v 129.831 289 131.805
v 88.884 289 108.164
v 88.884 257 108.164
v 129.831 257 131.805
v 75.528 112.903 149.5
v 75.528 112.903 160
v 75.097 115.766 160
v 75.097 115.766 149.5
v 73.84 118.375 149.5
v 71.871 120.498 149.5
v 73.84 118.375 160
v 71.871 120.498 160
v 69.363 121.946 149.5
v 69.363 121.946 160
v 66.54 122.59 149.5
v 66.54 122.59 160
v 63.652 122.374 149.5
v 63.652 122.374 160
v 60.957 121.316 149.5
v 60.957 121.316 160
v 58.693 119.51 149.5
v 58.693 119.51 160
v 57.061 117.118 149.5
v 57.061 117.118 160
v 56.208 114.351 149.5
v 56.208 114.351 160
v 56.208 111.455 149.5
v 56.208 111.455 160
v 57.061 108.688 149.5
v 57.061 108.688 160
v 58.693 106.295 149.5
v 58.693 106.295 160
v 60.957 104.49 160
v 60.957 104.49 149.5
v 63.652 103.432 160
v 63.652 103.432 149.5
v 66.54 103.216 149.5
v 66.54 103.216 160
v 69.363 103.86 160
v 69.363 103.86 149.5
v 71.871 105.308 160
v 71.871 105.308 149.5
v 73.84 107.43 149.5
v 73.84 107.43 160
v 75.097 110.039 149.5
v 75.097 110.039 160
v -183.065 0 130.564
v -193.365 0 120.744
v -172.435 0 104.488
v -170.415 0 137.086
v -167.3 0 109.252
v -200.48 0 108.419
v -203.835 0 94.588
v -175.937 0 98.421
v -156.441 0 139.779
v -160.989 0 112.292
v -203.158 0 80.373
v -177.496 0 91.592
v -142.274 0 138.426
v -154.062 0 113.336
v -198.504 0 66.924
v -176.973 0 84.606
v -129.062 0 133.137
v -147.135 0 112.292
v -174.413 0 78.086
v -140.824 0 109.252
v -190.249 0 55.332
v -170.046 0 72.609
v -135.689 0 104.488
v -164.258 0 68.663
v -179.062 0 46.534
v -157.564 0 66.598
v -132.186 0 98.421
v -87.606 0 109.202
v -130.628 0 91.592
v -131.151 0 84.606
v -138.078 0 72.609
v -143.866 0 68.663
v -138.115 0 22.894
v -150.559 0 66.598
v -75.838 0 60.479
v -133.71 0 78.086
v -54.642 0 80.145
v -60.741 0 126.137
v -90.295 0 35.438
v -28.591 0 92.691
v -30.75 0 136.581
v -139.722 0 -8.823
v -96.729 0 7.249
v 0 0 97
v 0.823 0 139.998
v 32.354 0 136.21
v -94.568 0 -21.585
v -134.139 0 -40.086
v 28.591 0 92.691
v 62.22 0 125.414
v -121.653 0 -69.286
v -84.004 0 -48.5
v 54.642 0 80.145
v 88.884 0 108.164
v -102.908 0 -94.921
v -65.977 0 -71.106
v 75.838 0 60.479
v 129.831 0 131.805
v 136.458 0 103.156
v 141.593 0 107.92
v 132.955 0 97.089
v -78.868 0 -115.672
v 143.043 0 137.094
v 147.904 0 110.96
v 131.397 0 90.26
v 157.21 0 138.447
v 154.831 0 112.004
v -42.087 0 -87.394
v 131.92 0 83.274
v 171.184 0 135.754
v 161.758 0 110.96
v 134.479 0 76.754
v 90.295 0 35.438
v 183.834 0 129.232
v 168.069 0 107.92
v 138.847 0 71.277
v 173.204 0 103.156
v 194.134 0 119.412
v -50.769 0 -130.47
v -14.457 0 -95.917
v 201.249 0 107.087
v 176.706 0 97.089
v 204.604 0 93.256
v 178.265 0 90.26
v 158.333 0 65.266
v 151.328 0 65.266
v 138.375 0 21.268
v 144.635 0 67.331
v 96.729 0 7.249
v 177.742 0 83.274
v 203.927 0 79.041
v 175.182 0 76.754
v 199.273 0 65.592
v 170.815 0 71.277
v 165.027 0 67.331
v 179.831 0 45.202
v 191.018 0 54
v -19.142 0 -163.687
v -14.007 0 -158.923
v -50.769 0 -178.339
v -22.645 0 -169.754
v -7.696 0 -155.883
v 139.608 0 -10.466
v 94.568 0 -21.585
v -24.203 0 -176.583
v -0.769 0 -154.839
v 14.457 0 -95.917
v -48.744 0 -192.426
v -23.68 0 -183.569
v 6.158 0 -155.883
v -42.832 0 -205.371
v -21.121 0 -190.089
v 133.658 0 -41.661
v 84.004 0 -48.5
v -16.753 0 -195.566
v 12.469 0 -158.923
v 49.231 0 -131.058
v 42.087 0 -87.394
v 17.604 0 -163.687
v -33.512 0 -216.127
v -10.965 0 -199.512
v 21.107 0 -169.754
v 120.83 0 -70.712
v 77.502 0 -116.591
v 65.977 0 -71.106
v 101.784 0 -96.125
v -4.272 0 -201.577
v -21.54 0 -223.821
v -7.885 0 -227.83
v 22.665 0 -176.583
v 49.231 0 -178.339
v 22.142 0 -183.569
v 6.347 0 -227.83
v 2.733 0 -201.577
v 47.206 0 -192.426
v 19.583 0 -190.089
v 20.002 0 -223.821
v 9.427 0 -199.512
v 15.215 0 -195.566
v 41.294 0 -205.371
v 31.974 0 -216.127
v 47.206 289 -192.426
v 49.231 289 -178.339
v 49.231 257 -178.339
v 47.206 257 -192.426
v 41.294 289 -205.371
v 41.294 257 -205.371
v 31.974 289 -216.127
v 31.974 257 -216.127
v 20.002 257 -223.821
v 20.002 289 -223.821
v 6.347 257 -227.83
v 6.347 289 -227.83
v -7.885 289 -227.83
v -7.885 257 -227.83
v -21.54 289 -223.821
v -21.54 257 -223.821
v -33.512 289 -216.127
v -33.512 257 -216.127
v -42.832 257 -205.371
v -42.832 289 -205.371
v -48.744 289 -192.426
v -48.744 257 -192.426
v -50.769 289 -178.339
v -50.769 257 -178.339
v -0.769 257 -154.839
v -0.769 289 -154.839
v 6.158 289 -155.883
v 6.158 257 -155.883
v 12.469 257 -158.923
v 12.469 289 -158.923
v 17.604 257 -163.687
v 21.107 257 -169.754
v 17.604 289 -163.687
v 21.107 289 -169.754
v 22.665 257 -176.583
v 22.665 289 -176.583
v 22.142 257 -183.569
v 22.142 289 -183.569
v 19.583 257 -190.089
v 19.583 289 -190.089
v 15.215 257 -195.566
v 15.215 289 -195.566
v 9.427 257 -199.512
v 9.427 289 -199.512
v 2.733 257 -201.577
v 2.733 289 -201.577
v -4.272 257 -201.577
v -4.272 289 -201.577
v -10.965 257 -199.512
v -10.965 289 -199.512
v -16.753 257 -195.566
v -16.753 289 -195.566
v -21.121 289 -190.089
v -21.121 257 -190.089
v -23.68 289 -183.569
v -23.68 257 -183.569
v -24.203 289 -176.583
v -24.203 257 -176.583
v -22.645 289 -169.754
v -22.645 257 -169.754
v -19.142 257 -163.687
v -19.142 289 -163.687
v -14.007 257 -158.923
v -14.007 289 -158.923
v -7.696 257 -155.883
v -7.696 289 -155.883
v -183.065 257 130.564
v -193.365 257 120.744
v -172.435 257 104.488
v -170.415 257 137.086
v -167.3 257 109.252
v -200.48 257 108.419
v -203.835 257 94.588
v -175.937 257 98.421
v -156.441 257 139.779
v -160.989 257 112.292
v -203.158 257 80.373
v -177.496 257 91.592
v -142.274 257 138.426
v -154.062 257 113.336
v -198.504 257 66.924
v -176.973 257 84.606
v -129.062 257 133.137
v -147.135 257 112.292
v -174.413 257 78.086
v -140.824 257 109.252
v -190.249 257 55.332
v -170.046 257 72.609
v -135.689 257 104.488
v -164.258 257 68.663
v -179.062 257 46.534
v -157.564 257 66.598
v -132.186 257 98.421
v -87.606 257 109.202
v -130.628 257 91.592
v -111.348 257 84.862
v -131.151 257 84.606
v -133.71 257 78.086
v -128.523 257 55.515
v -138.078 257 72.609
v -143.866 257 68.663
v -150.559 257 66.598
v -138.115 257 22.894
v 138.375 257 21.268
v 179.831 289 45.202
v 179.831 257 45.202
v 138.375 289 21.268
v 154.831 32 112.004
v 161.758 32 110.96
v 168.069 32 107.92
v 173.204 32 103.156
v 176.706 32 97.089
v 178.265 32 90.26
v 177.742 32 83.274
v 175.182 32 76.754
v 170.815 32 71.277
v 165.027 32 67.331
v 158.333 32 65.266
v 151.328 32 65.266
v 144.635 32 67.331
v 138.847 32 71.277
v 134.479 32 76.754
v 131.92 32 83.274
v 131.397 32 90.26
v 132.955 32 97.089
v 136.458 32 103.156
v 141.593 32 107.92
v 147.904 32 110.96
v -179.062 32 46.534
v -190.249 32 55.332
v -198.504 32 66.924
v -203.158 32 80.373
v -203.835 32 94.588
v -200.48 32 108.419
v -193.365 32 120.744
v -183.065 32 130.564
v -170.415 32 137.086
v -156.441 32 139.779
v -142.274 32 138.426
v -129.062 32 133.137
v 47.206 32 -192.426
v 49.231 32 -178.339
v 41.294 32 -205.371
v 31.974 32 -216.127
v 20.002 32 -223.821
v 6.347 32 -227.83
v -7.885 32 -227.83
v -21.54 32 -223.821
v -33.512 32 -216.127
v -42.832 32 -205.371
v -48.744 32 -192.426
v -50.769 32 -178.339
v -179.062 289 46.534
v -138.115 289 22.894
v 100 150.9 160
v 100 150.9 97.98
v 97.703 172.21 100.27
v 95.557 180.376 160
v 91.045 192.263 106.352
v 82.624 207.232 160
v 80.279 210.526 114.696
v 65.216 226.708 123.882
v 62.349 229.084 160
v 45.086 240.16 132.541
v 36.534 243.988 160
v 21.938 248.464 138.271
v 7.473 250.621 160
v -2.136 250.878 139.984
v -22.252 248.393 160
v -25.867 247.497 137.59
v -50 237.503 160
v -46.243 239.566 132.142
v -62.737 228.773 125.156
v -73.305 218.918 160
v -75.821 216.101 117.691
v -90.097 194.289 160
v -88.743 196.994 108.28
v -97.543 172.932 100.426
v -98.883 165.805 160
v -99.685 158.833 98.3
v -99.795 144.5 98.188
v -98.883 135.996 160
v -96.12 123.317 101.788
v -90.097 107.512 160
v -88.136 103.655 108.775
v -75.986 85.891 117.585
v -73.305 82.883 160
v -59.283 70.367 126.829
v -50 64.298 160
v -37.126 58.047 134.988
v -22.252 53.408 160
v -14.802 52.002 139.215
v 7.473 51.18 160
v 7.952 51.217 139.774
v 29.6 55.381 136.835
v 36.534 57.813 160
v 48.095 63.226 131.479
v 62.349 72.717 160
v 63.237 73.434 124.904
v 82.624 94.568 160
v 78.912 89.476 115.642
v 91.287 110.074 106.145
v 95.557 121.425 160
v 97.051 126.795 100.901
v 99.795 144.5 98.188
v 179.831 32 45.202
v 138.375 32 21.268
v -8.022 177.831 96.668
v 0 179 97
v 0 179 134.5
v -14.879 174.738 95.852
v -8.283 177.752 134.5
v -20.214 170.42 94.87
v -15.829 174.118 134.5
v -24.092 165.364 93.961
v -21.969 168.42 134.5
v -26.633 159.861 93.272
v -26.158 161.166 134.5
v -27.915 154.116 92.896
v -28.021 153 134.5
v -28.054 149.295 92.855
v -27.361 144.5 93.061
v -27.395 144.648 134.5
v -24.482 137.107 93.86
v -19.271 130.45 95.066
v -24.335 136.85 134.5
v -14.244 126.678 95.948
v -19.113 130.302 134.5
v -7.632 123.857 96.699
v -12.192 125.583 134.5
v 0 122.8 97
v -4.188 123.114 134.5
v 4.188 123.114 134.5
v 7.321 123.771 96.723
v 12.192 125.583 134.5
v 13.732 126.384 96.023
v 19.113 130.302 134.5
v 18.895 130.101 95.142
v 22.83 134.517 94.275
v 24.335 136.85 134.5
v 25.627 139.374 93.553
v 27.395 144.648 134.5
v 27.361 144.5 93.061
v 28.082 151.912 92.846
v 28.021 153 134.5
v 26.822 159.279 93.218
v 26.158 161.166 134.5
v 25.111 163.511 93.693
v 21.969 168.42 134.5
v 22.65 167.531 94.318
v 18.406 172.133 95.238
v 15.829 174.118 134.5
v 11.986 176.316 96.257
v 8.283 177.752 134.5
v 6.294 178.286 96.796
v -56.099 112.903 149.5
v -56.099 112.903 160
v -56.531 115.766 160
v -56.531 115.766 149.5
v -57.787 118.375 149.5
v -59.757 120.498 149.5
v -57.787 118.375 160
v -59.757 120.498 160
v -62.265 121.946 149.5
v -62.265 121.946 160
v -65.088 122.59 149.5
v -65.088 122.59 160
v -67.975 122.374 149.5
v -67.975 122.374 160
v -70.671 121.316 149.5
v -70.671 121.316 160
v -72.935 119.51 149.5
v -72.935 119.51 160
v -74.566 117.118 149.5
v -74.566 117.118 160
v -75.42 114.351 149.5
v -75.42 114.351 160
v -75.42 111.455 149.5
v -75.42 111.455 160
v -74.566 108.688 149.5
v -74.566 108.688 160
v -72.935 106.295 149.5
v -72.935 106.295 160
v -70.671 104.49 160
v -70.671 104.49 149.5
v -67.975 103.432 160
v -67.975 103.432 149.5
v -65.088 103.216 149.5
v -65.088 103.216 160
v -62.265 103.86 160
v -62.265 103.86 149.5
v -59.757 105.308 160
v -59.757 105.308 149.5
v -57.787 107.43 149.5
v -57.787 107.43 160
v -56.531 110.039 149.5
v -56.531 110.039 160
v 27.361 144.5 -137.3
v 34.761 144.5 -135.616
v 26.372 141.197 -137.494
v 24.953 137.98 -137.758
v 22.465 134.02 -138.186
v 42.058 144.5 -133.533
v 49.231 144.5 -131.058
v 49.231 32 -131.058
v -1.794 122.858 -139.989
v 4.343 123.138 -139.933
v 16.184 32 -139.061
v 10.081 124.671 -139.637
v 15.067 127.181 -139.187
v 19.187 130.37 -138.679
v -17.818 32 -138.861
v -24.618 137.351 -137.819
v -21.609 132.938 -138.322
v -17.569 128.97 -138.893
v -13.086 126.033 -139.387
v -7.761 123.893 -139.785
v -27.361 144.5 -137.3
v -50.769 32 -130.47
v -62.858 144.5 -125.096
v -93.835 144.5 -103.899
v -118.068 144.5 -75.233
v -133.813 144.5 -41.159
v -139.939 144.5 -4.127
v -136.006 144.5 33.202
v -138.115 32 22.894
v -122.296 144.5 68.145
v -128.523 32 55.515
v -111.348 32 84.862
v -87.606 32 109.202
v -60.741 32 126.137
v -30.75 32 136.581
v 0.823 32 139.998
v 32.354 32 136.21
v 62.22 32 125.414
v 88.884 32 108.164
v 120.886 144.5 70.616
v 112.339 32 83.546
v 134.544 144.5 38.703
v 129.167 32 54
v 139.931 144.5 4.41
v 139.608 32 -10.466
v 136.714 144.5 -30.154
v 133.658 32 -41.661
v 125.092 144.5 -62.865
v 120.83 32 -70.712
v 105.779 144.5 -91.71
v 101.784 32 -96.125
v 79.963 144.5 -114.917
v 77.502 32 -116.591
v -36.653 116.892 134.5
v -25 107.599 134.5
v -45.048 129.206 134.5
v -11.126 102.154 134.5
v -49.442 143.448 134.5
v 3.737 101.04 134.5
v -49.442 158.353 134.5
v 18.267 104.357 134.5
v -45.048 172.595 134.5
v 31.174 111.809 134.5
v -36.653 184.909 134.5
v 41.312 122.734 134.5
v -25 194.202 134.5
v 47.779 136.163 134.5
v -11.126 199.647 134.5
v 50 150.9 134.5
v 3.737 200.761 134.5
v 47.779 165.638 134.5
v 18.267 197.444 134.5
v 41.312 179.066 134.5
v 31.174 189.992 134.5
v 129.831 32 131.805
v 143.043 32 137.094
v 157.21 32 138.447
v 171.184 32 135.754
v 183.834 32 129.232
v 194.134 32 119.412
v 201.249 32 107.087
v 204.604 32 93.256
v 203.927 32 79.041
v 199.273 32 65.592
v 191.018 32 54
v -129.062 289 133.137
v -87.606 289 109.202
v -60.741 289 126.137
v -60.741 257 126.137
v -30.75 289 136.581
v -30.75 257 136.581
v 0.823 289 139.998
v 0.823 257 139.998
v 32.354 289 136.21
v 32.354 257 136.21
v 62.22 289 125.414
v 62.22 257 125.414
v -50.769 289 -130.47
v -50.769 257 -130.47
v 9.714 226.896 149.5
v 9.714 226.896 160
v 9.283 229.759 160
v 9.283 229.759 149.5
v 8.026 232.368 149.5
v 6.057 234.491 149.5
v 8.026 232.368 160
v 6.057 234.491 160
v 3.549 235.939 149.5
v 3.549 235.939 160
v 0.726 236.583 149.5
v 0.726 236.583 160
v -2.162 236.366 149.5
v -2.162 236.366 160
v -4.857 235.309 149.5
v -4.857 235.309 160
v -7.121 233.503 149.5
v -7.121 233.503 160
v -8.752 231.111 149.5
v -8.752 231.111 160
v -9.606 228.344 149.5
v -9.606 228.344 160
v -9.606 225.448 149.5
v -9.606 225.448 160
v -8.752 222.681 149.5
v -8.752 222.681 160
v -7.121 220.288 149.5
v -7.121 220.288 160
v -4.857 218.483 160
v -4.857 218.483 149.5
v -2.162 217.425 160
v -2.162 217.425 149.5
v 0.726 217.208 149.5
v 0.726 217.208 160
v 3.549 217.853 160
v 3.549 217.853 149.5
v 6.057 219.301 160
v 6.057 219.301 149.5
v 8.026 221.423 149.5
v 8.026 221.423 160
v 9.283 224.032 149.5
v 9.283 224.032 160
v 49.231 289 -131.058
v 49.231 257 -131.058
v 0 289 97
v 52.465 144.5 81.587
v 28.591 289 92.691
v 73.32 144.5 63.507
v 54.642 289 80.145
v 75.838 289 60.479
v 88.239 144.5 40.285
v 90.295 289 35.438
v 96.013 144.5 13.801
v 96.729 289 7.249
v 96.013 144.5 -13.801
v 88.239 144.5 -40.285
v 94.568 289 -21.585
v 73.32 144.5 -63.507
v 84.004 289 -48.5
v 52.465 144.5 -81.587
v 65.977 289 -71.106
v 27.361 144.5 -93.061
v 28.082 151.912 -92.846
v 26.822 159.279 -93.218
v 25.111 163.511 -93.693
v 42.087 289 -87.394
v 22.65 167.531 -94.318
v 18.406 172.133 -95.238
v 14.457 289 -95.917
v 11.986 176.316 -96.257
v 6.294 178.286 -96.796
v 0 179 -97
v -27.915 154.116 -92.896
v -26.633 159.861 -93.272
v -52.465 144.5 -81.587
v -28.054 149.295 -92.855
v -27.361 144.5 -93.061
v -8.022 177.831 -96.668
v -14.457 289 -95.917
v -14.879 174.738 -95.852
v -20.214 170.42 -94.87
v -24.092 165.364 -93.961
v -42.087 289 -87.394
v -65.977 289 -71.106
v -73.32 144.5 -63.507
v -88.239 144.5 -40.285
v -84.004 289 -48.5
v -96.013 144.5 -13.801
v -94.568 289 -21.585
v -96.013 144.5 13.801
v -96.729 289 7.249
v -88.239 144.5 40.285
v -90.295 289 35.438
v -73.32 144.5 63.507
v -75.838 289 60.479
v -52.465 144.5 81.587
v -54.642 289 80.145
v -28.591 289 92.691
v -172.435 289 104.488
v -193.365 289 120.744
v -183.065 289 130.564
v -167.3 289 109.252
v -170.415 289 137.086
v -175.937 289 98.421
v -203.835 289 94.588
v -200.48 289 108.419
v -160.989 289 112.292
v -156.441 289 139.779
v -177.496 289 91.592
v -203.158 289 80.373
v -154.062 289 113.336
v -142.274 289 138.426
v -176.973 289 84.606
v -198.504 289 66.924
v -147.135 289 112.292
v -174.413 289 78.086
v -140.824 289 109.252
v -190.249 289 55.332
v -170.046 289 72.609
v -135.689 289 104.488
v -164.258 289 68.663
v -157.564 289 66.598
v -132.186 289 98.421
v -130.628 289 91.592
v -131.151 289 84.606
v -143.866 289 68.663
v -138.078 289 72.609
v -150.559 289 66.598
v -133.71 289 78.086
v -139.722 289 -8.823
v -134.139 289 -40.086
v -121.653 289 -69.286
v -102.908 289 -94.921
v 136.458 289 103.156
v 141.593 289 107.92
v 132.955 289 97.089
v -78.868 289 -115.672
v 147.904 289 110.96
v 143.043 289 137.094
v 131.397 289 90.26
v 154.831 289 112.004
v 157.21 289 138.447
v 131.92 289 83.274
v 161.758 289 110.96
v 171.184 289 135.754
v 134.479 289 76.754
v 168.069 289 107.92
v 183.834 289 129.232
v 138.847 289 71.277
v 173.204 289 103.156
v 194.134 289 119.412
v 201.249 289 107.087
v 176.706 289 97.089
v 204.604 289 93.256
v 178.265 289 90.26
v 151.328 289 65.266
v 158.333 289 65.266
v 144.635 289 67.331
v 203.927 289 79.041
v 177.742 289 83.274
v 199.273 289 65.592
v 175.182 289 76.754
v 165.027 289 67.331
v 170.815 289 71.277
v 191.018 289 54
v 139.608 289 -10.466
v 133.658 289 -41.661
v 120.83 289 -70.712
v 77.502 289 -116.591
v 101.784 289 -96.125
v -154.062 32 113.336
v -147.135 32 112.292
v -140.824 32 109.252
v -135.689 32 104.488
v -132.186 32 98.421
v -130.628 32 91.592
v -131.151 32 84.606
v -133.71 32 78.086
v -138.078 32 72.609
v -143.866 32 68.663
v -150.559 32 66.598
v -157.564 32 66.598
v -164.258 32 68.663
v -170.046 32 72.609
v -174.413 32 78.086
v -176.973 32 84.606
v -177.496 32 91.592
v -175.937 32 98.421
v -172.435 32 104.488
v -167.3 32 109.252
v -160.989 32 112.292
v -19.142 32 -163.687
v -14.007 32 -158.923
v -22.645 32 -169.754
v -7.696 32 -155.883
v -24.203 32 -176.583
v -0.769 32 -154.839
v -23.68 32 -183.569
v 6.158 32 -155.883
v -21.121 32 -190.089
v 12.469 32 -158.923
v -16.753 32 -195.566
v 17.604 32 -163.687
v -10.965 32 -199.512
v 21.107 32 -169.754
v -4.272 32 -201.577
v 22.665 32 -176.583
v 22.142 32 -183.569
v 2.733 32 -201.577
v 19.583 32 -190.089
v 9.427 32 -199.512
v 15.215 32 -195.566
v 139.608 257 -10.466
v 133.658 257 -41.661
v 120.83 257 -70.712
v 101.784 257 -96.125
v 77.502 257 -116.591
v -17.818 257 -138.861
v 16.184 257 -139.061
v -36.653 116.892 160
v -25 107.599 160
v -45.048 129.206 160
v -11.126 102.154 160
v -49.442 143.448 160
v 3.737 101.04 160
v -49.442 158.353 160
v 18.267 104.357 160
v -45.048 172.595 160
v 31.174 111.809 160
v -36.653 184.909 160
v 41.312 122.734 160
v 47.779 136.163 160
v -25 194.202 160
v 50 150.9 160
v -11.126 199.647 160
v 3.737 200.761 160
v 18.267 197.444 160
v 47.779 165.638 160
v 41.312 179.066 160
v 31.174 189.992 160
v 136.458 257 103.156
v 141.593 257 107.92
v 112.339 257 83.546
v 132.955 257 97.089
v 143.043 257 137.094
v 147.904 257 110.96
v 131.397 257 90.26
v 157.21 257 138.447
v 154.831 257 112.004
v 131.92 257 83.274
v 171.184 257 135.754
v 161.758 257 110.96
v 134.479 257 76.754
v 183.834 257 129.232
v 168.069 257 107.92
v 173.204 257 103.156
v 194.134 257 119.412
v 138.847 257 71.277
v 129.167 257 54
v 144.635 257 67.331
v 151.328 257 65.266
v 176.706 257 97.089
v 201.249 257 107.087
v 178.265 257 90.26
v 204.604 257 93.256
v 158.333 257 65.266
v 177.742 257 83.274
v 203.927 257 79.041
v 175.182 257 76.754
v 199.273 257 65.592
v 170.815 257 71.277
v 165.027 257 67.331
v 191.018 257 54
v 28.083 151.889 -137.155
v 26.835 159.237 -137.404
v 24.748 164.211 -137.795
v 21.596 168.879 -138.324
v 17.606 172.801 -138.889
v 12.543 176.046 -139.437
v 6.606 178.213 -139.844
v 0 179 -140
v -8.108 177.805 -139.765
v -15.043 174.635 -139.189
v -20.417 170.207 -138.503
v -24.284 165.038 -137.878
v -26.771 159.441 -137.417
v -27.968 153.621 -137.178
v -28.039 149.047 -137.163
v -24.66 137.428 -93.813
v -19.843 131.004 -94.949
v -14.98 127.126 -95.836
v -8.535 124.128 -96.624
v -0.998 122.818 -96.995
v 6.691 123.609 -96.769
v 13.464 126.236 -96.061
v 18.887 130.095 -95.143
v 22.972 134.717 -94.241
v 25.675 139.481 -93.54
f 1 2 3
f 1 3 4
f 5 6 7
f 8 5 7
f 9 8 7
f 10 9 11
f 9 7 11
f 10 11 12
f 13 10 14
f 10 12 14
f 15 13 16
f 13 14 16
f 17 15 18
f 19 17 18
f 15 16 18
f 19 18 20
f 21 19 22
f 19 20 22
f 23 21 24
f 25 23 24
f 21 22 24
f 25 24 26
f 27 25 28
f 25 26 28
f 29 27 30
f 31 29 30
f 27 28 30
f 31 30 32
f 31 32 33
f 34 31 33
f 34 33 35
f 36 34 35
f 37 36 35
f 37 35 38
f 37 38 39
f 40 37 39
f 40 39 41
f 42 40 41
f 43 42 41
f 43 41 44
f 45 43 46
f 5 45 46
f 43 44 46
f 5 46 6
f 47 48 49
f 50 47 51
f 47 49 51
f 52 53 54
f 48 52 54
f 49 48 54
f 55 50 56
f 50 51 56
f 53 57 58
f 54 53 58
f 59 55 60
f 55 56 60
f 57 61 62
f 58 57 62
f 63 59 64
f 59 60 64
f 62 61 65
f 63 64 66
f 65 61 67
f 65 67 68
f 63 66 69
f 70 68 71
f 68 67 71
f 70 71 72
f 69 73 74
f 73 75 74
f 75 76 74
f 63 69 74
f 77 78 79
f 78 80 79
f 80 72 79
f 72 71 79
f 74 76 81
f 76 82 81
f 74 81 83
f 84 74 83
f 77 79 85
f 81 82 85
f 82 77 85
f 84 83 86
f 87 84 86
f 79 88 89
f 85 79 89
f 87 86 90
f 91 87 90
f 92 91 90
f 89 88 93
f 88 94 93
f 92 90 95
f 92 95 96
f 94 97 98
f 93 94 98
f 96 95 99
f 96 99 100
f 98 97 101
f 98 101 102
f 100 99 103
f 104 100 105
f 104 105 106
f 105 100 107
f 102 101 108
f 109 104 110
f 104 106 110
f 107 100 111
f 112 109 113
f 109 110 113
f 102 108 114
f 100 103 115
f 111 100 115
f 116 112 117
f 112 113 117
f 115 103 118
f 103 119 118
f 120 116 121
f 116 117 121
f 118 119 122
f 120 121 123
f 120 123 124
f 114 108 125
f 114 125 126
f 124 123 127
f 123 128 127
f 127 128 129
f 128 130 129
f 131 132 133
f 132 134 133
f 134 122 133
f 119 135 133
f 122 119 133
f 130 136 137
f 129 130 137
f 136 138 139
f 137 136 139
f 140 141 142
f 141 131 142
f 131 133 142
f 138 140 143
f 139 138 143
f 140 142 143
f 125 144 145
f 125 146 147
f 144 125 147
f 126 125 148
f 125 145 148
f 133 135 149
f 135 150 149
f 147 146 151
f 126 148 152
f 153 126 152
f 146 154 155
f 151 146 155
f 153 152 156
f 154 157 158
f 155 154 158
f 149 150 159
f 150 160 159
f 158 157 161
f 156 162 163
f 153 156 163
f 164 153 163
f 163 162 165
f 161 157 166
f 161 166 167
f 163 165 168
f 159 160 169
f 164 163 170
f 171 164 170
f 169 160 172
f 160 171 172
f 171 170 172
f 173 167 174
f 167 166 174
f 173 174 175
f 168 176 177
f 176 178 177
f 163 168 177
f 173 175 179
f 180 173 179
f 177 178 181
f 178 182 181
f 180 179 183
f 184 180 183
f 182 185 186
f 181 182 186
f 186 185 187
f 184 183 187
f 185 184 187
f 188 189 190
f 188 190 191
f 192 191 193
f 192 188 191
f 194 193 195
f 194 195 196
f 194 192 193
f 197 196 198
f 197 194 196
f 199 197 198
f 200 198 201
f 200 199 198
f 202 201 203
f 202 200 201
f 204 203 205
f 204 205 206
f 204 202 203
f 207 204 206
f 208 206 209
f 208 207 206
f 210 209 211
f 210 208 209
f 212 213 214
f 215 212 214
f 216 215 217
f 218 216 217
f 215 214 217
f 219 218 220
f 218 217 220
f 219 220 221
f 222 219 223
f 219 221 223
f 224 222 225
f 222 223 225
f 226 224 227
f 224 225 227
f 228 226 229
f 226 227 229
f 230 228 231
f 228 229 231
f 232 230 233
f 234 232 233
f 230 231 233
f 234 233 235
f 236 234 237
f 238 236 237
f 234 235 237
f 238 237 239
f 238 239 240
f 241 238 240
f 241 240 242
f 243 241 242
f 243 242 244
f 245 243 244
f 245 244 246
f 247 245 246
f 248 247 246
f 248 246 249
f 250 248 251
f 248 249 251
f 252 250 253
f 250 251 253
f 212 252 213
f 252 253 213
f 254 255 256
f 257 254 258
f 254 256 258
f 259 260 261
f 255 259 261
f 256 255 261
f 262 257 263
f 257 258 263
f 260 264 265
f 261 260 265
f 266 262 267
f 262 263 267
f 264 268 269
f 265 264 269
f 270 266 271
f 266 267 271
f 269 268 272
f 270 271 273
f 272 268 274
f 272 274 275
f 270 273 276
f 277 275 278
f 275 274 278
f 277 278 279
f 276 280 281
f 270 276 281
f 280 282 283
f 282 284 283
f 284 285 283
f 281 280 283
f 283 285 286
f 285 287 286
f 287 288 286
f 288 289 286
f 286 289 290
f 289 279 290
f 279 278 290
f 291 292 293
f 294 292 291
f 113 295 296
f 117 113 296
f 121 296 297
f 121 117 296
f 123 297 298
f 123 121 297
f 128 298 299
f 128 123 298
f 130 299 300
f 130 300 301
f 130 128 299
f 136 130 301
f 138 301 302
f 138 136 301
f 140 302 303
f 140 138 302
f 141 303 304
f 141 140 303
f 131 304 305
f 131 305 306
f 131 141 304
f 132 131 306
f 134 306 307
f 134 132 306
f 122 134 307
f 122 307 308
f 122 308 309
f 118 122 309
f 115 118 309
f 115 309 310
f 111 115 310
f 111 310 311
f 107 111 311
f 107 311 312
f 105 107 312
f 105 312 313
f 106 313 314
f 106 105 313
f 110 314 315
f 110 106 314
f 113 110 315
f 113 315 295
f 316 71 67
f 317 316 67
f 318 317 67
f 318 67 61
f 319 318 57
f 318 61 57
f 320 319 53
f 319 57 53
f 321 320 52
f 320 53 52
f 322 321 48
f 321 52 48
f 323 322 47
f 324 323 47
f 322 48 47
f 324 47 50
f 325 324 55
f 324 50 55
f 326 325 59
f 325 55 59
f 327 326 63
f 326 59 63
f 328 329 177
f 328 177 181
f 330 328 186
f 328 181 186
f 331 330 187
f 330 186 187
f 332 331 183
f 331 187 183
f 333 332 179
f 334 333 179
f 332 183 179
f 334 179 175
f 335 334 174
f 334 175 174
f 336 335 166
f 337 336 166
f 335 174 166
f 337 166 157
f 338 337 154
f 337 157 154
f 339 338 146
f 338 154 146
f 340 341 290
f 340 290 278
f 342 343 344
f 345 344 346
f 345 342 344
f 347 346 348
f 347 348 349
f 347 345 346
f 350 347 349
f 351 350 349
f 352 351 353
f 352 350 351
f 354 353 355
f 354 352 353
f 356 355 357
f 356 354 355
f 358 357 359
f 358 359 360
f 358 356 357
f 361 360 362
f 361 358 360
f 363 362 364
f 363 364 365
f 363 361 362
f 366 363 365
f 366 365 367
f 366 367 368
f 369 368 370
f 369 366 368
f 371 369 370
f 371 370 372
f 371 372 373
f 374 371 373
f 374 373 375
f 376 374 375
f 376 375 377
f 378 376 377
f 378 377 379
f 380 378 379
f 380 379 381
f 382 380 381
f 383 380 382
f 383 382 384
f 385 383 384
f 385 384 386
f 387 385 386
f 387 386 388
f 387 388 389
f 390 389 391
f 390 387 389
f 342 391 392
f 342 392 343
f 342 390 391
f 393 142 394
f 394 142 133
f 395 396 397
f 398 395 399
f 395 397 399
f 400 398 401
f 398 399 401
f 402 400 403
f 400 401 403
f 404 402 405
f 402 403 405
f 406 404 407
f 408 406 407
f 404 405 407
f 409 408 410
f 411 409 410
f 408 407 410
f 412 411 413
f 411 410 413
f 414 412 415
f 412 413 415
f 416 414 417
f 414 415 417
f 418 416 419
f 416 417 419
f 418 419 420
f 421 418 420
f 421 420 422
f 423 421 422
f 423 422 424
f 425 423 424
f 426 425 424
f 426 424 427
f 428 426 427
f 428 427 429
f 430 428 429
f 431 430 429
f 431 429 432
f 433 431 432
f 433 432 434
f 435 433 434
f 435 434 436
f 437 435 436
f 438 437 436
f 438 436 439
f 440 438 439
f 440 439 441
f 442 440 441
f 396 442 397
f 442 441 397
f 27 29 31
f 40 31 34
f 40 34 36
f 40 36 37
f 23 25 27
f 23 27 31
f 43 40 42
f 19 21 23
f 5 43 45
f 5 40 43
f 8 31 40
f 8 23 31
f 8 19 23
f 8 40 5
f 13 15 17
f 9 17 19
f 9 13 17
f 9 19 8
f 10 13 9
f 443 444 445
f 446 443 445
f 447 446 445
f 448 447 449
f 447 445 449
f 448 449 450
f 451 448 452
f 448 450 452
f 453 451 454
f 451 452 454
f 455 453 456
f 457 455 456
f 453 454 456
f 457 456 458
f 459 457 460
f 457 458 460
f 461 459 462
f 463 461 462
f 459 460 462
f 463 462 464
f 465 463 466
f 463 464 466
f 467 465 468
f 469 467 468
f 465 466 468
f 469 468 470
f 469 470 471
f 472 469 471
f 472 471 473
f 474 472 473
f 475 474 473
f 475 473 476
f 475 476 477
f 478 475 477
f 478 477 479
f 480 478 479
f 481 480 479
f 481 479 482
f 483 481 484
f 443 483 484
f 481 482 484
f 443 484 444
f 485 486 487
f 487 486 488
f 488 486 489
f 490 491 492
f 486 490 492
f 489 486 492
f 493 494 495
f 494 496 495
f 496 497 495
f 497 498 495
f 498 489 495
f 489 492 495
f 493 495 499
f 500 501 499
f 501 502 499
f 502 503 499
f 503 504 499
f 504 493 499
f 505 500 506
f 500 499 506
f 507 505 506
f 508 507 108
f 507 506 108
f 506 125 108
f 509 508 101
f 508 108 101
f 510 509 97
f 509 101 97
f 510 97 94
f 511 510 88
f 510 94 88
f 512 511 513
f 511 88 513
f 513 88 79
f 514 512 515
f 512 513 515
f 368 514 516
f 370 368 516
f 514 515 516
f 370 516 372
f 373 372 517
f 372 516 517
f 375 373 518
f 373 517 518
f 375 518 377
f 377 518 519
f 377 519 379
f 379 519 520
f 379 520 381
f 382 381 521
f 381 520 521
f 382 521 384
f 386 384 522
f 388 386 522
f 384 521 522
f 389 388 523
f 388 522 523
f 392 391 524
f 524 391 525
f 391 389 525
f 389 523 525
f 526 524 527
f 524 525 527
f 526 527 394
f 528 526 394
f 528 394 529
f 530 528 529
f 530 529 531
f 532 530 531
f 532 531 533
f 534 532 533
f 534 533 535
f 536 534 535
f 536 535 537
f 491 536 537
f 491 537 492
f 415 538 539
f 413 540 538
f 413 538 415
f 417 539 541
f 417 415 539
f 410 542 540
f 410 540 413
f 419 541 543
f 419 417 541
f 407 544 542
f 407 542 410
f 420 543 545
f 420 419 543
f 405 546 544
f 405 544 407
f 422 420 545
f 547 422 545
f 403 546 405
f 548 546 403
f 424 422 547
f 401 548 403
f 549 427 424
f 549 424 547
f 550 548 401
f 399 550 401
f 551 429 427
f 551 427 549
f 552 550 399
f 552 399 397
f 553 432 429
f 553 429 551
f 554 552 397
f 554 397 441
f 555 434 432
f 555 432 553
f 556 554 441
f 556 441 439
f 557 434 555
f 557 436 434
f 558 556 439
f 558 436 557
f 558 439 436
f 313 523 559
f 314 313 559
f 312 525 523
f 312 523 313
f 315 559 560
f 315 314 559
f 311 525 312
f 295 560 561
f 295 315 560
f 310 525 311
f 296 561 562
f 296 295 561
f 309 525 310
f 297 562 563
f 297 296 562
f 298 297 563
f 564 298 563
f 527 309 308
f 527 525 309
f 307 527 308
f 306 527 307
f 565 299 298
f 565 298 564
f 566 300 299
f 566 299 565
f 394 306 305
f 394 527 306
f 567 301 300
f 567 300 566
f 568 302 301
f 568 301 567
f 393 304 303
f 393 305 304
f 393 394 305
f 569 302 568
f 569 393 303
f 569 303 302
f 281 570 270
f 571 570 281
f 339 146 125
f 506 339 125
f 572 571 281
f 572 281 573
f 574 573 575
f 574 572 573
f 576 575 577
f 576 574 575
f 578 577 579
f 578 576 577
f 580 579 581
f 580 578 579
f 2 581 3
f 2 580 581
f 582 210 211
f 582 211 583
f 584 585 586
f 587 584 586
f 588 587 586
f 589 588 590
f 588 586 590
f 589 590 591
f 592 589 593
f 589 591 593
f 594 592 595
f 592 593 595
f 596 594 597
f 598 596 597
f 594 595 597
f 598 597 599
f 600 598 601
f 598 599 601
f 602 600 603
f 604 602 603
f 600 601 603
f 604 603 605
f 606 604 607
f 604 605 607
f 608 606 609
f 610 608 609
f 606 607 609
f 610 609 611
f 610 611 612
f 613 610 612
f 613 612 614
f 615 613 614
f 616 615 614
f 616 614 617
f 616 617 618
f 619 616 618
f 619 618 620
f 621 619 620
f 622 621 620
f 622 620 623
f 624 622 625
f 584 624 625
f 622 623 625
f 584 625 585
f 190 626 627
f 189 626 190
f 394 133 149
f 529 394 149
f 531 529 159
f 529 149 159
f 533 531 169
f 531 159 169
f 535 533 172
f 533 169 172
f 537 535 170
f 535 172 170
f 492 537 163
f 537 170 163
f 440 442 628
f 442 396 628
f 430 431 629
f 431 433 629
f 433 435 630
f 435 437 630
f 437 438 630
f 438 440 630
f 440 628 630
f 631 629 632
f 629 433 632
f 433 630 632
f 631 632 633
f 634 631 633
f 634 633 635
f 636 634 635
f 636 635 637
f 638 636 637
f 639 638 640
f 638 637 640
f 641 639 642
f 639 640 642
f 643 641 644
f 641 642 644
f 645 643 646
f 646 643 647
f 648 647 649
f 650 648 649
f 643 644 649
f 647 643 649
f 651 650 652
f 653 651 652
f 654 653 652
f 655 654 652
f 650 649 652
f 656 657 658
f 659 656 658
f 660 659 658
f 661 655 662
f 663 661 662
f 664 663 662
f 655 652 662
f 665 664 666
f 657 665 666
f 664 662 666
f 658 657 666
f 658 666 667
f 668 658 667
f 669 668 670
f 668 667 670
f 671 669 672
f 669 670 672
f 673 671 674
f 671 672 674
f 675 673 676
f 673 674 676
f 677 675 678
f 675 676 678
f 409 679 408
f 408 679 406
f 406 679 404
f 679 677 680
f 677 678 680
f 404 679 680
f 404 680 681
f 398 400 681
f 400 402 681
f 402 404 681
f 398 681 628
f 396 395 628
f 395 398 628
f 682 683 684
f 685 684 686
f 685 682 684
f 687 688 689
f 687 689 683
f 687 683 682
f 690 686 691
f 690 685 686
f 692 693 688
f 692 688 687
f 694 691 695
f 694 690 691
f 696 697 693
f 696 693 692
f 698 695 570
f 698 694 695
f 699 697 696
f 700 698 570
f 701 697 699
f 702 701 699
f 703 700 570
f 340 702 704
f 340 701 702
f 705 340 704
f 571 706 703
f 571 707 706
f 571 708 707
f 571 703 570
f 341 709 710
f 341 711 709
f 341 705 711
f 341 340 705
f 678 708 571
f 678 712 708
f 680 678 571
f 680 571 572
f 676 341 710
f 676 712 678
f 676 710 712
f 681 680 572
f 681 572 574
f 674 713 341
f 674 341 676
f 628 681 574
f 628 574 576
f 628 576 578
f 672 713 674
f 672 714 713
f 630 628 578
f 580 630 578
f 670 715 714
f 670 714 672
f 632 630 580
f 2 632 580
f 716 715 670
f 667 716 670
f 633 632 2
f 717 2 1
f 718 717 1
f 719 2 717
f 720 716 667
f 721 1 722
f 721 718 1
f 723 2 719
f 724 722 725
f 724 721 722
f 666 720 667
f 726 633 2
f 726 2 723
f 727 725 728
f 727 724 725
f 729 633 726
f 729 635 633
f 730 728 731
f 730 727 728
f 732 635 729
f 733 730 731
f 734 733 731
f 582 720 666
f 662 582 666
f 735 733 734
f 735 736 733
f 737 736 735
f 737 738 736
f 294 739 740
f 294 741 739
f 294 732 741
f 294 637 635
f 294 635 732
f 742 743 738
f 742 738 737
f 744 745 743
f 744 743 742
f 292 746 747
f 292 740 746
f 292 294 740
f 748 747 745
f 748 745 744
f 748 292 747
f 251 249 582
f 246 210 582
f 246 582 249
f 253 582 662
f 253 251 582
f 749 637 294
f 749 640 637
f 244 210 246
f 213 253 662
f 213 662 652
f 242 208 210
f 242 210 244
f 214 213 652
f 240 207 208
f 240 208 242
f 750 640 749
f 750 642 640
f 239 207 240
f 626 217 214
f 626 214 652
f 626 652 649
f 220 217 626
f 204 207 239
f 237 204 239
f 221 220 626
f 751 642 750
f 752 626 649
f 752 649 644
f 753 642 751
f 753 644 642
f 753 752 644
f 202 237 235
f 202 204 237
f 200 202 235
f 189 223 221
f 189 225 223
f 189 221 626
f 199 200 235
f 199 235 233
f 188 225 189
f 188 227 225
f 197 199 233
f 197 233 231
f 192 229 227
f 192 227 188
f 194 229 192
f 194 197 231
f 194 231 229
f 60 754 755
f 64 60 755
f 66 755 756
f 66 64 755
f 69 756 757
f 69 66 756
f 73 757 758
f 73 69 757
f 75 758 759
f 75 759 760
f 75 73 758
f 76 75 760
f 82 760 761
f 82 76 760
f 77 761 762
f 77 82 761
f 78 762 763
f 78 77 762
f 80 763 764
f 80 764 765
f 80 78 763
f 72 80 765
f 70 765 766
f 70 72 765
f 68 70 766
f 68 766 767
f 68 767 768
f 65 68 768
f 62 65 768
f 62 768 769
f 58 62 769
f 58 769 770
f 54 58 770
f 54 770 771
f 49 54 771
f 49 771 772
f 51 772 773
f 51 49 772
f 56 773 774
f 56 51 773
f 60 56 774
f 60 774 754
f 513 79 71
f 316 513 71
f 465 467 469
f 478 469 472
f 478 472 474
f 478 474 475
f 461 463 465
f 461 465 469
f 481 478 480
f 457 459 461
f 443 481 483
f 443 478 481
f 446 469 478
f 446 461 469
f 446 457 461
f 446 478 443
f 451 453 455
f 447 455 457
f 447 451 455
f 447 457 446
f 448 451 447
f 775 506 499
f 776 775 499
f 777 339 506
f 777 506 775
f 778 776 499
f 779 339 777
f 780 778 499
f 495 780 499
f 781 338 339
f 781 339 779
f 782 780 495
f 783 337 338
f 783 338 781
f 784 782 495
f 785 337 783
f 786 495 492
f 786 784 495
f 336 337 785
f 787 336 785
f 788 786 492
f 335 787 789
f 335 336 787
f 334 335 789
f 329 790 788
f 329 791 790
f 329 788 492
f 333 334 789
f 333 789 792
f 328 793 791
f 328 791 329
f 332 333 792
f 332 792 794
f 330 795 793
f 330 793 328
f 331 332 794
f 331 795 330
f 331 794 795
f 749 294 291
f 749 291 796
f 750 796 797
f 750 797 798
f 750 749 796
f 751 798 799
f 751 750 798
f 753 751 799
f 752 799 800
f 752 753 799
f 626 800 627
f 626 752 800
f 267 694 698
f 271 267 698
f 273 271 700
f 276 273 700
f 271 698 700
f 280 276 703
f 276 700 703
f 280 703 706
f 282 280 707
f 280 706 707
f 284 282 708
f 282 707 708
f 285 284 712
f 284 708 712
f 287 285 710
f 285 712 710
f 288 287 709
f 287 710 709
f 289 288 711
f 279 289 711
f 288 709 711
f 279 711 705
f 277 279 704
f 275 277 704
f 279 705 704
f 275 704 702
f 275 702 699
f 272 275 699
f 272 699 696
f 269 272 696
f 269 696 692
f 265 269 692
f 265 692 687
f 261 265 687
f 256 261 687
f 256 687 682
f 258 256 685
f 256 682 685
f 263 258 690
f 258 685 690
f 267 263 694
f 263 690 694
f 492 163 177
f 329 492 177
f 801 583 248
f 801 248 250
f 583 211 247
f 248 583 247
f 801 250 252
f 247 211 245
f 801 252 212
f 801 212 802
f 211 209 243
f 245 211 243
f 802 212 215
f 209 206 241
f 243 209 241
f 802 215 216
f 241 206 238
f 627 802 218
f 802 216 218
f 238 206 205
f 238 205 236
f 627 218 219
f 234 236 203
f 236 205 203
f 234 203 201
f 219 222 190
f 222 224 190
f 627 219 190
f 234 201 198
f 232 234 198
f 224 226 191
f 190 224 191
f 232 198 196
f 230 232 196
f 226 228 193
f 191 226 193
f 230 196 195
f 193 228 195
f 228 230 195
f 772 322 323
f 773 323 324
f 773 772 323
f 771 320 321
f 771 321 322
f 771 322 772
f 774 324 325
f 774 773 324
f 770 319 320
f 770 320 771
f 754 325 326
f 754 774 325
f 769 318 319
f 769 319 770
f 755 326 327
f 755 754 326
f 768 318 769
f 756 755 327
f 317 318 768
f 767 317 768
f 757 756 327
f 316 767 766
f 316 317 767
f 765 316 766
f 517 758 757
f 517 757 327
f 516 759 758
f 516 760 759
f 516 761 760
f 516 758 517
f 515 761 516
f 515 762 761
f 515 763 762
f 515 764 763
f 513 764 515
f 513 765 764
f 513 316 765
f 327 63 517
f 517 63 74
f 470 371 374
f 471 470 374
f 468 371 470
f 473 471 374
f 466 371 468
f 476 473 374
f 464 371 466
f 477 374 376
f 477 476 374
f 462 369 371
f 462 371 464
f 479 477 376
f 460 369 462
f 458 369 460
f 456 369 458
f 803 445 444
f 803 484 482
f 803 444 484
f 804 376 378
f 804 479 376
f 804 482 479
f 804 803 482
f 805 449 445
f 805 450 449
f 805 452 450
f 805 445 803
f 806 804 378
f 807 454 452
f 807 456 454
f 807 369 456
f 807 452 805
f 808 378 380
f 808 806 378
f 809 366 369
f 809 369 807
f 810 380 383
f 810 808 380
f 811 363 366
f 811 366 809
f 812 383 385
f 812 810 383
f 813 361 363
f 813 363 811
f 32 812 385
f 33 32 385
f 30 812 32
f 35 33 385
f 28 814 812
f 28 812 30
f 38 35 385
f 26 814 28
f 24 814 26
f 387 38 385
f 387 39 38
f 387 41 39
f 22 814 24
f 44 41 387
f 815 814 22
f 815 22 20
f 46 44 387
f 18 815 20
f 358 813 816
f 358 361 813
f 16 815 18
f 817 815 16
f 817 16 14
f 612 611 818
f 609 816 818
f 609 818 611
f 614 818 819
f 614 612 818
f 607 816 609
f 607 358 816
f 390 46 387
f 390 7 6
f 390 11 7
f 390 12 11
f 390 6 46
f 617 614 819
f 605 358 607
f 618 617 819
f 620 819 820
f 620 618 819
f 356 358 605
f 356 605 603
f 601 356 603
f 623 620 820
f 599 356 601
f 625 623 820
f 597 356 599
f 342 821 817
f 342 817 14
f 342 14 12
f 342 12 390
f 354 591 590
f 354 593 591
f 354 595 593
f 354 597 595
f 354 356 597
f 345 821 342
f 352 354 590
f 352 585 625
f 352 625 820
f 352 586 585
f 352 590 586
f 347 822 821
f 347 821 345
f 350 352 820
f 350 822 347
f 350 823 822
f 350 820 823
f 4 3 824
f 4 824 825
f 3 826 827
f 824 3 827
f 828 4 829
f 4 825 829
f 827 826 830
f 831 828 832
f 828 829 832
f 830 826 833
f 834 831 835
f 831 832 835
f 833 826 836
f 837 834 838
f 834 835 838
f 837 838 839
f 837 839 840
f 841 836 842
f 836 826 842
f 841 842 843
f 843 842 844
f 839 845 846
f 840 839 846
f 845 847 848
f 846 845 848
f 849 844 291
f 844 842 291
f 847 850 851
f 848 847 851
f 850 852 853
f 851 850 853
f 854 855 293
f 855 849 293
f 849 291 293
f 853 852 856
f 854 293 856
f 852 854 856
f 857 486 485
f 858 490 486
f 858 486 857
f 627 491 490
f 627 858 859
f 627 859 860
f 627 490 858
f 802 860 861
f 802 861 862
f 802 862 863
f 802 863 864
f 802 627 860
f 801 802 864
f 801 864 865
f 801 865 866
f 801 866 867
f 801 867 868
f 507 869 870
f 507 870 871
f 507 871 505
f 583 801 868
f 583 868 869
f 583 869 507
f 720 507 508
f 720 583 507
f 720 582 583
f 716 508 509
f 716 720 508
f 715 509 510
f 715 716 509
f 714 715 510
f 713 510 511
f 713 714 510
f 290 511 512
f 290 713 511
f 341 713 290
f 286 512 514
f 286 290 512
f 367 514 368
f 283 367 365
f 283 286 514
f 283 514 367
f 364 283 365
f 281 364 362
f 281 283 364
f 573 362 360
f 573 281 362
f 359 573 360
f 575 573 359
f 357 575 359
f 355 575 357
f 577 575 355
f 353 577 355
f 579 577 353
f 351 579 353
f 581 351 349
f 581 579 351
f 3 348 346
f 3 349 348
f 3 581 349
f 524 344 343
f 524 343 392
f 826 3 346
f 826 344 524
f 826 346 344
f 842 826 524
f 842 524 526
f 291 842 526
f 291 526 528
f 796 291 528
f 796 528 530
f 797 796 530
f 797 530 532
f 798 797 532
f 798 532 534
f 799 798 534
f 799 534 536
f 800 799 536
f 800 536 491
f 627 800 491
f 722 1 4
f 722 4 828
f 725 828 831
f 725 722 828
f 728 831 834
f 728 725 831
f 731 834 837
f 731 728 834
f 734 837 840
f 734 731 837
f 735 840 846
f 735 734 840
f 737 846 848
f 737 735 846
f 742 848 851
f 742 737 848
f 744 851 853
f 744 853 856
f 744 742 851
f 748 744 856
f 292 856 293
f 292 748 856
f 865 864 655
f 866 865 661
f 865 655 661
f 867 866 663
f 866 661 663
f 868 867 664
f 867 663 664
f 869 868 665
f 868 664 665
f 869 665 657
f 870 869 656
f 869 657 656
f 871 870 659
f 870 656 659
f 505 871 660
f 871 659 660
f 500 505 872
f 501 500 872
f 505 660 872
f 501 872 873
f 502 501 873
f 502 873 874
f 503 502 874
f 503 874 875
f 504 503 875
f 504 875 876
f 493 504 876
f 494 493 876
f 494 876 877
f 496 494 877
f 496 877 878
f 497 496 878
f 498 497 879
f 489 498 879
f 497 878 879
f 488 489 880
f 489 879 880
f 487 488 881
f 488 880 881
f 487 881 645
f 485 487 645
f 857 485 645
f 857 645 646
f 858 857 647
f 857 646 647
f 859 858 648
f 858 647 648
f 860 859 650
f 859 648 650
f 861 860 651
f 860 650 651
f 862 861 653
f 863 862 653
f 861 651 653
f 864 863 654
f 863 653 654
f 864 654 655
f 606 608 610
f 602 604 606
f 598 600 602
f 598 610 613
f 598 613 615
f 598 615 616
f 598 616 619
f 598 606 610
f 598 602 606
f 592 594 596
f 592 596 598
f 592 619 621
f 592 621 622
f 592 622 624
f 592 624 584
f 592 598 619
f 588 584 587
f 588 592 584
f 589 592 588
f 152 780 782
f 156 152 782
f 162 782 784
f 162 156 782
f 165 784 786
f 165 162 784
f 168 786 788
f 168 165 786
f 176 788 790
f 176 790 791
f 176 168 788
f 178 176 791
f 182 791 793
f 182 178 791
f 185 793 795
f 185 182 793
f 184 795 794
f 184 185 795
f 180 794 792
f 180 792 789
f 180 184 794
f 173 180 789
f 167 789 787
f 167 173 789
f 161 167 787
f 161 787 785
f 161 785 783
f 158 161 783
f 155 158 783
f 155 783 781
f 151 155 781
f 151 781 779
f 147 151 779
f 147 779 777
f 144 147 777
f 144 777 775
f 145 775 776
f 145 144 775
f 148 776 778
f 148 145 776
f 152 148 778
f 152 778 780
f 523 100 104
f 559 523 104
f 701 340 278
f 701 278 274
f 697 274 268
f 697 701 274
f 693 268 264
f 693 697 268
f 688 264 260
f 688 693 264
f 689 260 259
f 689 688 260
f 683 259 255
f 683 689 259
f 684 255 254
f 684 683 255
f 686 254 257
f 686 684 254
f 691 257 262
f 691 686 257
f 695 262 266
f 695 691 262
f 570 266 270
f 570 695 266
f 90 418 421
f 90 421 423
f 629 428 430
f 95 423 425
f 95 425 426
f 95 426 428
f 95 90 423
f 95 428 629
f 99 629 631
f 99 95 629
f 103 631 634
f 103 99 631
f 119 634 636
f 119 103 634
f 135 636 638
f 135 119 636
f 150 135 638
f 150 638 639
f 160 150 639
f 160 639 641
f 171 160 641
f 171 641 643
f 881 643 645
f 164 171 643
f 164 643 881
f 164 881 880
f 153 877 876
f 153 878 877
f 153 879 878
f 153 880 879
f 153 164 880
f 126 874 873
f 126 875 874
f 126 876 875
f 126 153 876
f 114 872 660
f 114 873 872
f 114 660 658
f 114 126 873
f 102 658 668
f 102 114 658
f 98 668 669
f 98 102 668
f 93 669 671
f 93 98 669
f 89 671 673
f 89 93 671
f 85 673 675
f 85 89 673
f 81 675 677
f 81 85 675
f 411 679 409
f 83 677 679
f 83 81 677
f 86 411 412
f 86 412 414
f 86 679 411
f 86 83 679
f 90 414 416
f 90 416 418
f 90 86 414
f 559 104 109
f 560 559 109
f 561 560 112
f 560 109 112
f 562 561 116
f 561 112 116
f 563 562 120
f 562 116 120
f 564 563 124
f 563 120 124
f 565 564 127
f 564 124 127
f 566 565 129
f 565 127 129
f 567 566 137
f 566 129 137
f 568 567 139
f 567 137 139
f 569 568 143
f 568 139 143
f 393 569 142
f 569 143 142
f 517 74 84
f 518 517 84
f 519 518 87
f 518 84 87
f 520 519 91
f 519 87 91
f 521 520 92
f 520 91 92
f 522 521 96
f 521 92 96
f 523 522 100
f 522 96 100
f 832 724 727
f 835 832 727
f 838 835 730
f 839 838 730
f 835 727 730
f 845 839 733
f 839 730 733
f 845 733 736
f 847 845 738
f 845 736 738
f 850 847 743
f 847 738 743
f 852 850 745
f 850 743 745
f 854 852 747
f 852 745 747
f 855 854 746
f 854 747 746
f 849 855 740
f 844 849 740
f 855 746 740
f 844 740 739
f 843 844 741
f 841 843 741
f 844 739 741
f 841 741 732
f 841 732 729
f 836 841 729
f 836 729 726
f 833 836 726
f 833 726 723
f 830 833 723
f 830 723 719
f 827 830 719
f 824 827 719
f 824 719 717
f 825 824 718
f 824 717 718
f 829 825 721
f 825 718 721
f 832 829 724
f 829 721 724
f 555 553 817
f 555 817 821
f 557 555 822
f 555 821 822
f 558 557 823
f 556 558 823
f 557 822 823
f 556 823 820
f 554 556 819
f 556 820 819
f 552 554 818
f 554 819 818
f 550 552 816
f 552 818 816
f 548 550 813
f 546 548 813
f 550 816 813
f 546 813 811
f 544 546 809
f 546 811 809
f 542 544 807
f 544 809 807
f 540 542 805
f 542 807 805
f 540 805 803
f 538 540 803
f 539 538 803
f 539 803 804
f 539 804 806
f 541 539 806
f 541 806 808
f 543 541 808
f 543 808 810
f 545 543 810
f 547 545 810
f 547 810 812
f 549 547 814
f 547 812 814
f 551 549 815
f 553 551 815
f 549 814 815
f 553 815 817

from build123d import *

# Parameters (mm, degrees)
SKETCH2_R                 = 23.5
SKETCH2_R_2               = 97
BOSS_EXTRUDE5_DEPTH       = 32
SKETCH3_R                 = 140
SKETCH3_R_2               = 97
BOSS_EXTRUDE8_DEPTH       = 112.5
BOSS_EXTRUDE10_REACH      = 527.627
BOSS_EXTRUDE10_END_RADIUS = 140
SKETCH4_R                 = 100
SKETCH5_R                 = 50
CUT_EXTRUDE1_DEPTH        = 25.5
SKETCH7_R                 = 28.1
CUT_EXTRUDE2_DEPTH        = 328.5
SKETCH9_R                 = 9.714368659
CUT_EXTRUDE3_DEPTH        = 10.5


with BuildPart() as part:
    # Sketch2 → Boss-Extrude5 (new body)
    with BuildSketch(Plane(origin=(0, 0, 0), x_dir=(1, 0, 0), z_dir=(0, 1, 0))):
        with BuildLine():
            ThreePointArc((49.230976904, 178.339293487), (-0.769023096, 228.339293487), (-50.769023096, 178.339293487))
            Line((-50.769023096, 178.339293487), (-50.769023096, 130.470327254))
            ThreePointArc((-50.769023096, 130.470327254), (-121.653121624, 69.285770538), (-138.115414376, -22.893936133))
            Line((-138.115414376, -22.893936133), (-179.061847104, -46.534370091))
            ThreePointArc((-179.061847104, -46.534370091), (-197.363117294, -114.835640281), (-129.061847104, -133.13691047))
            Line((-129.061847104, -133.13691047), (-87.606106294, -109.202427354))
            ThreePointArc((-87.606106294, -109.202427354), (0.823323405, -139.997579045), (88.884437472, -108.164489437))
            Line((88.884437472, -108.164489437), (129.8308702, -131.804923395))
            ThreePointArc((129.8308702, -131.804923395), (198.13214039, -113.503653206), (179.8308702, -45.202383017))
            Line((179.8308702, -45.202383017), (138.37512939, -21.267899901))
            ThreePointArc((138.37512939, -21.267899901), (120.829798219, 70.711808507), (49.230976904, 131.058425571))
            Line((49.230976904, 131.058425571), (49.230976904, 178.339293487))
        make_face()
        with Locations(Location((-0.769023096, 178.339293487, 0), (0, 0, 270))):
            Circle(SKETCH2_R, mode=Mode.SUBTRACT)
        with Locations(Location((0, 0, 0), (0, 0, 270))):
            Circle(SKETCH2_R_2, mode=Mode.SUBTRACT)
        with Locations(Location((-154.061847104, -89.835640281, 0), (0, 0, 270))):
            Circle(SKETCH2_R, mode=Mode.SUBTRACT)
        with Locations(Location((154.8308702, -88.503653206, 0), (0, 0, 270))):
            Circle(SKETCH2_R, mode=Mode.SUBTRACT)
    extrude(amount=BOSS_EXTRUDE5_DEPTH)

    # Sketch3 → Boss-Extrude8 (add)
    with BuildSketch(Plane(origin=(0, 32, 0), x_dir=(1, 0, 0), z_dir=(0, 1, 0))):
        with Locations(Location((0, 0, 0), (0, 0, 69.411740358))):
            Circle(SKETCH3_R)
        with Locations(Location((0, 0, 0), (0, 0, 270))):
            Circle(SKETCH3_R_2, mode=Mode.SUBTRACT)
    extrude(amount=BOSS_EXTRUDE8_DEPTH)

    # Mirror1: part across plane


with BuildPart() as part_1:
    add(part.part)
    add(part.part.mirror(Plane.ZX.offset(144.5)))

    # Boss-Extrude10: up to this cylinder (the profile starts outside it)
    boss_extrude10_end = Plane(origin=(0, 150.900402, 0), z_dir=(0, -1, 0)) * Cylinder(BOSS_EXTRUDE10_END_RADIUS, 1336.254, mode=Mode.PRIVATE)
    # Sketch4 → Boss-Extrude10 (add, up to the surface)
    with BuildSketch(Plane.XY.offset(160), mode=Mode.PRIVATE) as boss_extrude10_sk1:
        with Locations((0, 150.900402454)):
            Circle(SKETCH4_R)
    boss_extrude10_tool1 = extrude(boss_extrude10_sk1.sketch, amount=-BOSS_EXTRUDE10_REACH, mode=Mode.PRIVATE) - boss_extrude10_end
    add(boss_extrude10_tool1.solids().sort_by_distance((0, 150.900402, 160))[0])

    # Sketch5 → Cut-Extrude1 (cut)
    with BuildSketch(Plane.XY.offset(160)):
        with Locations((0, 150.900402454)):
            Circle(SKETCH5_R)
    extrude(amount=-CUT_EXTRUDE1_DEPTH, mode=Mode.SUBTRACT)

    # Sketch7 → Cut-Extrude2 (cut)
    with BuildSketch(Plane.XY.offset(134.5)):
        with Locations(Location((0, 150.900402454, 0), (0, 0, 90))):
            Circle(SKETCH7_R)
    extrude(amount=-CUT_EXTRUDE2_DEPTH, mode=Mode.SUBTRACT)

    # Sketch9 → Cut-Extrude3 (cut)
    with BuildSketch(Plane.XY.offset(160)):
        with Locations((0, 226.895659714)):
            Circle(SKETCH9_R)
        with Locations((65.813823354, 112.902773824)):
            Circle(SKETCH9_R)
        with Locations((-65.813823354, 112.902773824)):
            Circle(SKETCH9_R)
    extrude(amount=-CUT_EXTRUDE3_DEPTH, mode=Mode.SUBTRACT)


solid = part_1.part
